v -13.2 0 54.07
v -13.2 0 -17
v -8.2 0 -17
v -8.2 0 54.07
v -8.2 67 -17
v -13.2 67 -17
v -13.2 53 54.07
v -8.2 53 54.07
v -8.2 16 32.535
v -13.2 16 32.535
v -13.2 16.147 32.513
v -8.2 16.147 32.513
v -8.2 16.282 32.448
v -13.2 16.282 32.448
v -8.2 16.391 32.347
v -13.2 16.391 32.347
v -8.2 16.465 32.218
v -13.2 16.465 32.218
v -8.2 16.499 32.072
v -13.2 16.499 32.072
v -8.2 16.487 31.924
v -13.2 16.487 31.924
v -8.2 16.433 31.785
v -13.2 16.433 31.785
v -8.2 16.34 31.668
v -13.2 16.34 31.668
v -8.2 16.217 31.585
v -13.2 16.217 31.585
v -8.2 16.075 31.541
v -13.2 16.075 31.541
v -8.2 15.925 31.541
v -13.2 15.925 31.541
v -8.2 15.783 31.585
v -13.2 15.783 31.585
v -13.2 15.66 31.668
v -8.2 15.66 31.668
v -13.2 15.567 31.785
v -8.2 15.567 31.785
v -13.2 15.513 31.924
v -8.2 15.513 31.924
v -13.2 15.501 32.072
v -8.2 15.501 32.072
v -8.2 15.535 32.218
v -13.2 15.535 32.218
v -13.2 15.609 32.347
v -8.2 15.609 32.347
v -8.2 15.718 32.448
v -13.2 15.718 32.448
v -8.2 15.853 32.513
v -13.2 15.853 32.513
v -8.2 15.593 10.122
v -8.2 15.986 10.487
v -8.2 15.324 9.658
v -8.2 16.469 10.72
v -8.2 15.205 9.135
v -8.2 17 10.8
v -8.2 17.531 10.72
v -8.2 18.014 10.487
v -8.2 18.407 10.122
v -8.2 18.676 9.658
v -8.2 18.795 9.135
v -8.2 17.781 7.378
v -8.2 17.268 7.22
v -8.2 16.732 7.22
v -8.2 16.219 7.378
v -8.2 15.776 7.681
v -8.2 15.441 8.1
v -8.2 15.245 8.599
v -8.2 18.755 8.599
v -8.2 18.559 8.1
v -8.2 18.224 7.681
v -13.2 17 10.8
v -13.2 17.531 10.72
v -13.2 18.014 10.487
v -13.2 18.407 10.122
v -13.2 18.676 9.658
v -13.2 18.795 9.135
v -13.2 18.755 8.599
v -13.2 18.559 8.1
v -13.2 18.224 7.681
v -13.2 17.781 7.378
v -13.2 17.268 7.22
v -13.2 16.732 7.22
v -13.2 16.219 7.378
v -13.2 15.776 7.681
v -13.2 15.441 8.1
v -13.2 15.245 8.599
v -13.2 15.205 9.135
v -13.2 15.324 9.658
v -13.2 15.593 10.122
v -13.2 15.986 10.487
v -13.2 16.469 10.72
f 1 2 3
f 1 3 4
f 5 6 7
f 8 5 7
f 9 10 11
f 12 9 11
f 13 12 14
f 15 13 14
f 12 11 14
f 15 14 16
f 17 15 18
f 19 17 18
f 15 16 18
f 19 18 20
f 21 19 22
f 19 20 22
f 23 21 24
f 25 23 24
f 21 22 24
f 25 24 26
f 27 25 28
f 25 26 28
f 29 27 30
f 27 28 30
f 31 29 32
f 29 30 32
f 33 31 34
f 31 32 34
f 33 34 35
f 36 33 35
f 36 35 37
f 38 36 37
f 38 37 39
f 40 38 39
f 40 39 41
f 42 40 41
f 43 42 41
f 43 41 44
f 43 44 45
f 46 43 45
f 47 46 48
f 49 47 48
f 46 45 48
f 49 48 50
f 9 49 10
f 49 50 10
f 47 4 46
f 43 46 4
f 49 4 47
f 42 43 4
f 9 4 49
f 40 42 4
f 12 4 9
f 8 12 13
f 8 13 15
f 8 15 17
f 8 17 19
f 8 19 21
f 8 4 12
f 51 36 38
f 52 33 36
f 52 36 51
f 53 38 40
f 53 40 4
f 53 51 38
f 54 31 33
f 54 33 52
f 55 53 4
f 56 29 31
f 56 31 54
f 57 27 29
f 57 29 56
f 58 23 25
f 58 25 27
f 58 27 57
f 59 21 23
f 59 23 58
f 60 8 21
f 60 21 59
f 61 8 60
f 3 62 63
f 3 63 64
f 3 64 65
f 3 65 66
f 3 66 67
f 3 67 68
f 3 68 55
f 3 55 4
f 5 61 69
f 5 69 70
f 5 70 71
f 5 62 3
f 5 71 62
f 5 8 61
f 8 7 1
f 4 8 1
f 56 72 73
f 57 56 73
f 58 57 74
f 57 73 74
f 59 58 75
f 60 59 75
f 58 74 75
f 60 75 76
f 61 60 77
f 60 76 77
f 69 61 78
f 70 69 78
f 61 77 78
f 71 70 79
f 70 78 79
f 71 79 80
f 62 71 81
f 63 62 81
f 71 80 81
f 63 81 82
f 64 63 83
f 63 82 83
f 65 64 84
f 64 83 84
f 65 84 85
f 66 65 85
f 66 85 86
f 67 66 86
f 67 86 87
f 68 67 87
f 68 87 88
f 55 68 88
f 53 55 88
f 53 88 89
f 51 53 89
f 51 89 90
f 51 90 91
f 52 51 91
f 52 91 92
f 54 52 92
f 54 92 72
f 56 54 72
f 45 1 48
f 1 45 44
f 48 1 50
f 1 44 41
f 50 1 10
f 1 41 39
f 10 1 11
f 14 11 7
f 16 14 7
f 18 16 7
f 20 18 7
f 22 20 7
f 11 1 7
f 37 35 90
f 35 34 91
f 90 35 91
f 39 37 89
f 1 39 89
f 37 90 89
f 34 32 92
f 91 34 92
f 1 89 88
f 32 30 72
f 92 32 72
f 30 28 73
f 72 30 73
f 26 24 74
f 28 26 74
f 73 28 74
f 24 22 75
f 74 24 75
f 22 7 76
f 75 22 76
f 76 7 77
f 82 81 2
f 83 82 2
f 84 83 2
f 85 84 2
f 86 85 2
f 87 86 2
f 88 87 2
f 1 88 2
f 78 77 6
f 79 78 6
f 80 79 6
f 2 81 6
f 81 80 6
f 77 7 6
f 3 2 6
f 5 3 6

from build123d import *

# Parameters (mm, degrees)
SKETCH1_W                = 50
SKETCH1_H                = 9.1
BOSS_EXTRUDE1_DEPTH      = 2
SKETCH2_W                = 25
SKETCH2_H                = 6.6
CUT_EXTRUDE1_DEPTH       = 2
SKETCH3_R                = 1.8
CUT_EXTRUDE2_DEPTH       = 2
SKETCH4_W                = 66.4
SKETCH4_H                = 130
BOSS_EXTRUDE2_DEPTH      = 2
SKETCH5_W                = 66.4
SKETCH5_H                = 2
BOSS_EXTRUDE3_DEPTH      = 2.5
SKETCH6_W                = 8.6
SKETCH6_H                = 62.5
BOSS_EXTRUDE4_DEPTH      = 2
SKETCH7_R                = 1.8
SKETCH7_W                = 3
SKETCH7_H                = 5
CUT_EXTRUDE3_DEPTH       = 2
SKETCH8_W                = 25
SKETCH8_H                = 45
CUT_EXTRUDE4_DEPTH       = 20
SKETCH9_W                = 25
SKETCH9_H                = 10
BOSS_EXTRUDE5_DEPTH      = 2
SKETCH10_W               = 34.7
SKETCH10_H               = 27.07
BOSS_EXTRUDE6_DEPTH      = 2
SKETCH11_R               = 1.8
CUT_EXTRUDE5_DEPTH       = 2
SKETCH12_R               = 1.8
CUT_EXTRUDE6_DEPTH       = 2
SKETCH13_W               = 2
SKETCH13_H               = 2
BOSS_EXTRUDE7_DEPTH      = 44
SKETCH14_W               = 2
SKETCH14_H               = 2
BOSS_EXTRUDE8_DEPTH      = 46
SKETCH16_W               = 42
SKETCH16_H               = 43
BOSS_EXTRUDE10_DEPTH     = 2
SKETCH18_R               = 1.8
CUT_EXTRUDE7_DEPTH       = 2
BOSS_EXTRUDE12_DEPTH     = 2
SKETCH21_W               = 2
SKETCH21_H               = 2
BOSS_EXTRUDE13_DEPTH     = 10
SKETCH25_W               = 3
SKETCH25_H               = 5
CUT_EXTRUDE8_DEPTH       = 10
SKETCH26_W               = 6.2
SKETCH26_H               = 13
SKETCH26_W_2             = 21
SKETCH26_H_2             = 6.6
BOSS_EXTRUDE14_DEPTH     = 2
SKETCH27_W               = 2
SKETCH27_H               = 27
SKETCH27_H_2             = 24.93
BOSS_EXTRUDE15_DEPTH     = 2
SKETCH29_W               = 10
SKETCH29_H               = 10
BOSS_EXTRUDE19_DEPTH     = 2
SKETCH41_R               = 1.8
CUT_EXTRUDE15_DEPTH      = 2
BOSS_EXTRUDE26_DEPTH     = 2
SKETCH43_W               = 70.4
SKETCH43_H               = 2
BOSS_EXTRUDE27_DEPTH     = 11
SKETCH44_W               = 10
SKETCH44_H               = 5
BOSS_EXTRUDE28_DEPTH     = 2
SKETCH45_R               = 1.8
BOSS_EXTRUDE29_DEPTH     = 2
SKETCH46_R               = 1.8
CUT_EXTRUDE16_DEPTH      = 2
SKETCH47_W               = 10
SKETCH47_H               = 1
BOSS_EXTRUDE30_DEPTH     = 2
SKETCH48_W               = 32.7
SKETCH48_H               = 31.07
SKETCH48_W_2             = 101.75
SKETCH48_H_2             = 120.487369876
CUT_EXTRUDE17_DEPTH      = 20
SKETCH50_W               = 66.4
SKETCH50_H               = 81.07
CUT_EXTRUDE19_DEPTH      = 20
SKETCH51_W               = 70.4
SKETCH51_H               = 85.07
SKETCH51_W_2             = 66.4
SKETCH51_H_2             = 81.07
BOSS_EXTRUDE31_DEPTH     = 20
SKETCH52_W               = 10
SKETCH52_H               = 1
BOSS_EXTRUDE32_DEPTH     = 2
SKETCH53_W               = 10
SKETCH53_H               = 4
CUT_EXTRUDE20_DEPTH      = 2
BOSS_EXTRUDE33_START     = 1
SKETCH54_W               = 10
SKETCH54_H               = 12
SKETCH54_R               = 1.8
BOSS_EXTRUDE33_DEPTH     = 1
CUT_EXTRUDE23_DEPTH      = 96
CUT_EXTRUDE23_DEPTH_BACK = 16
SKETCH59_R               = 1.8
SKETCH62_W               = 66.985033768
SKETCH62_H               = 11.249394984
BOSS_EXTRUDE38_DEPTH     = 1
SKETCH65_R               = 1.8
CUT_EXTRUDE27_DEPTH      = 3
SKETCH66_R               = 1
CUT_EXTRUDE28_DEPTH      = 87
BOSS_EXTRUDE41_DEPTH     = 2
BOSS_EXTRUDE42_DEPTH     = 2
BOSS_EXTRUDE43_DEPTH     = 2
SKETCH68_W               = 6.791832398
SKETCH68_H               = 8.144168394
SKETCH68_W_2             = 5.485710784
SKETCH68_W_3             = 7.764004839
SKETCH68_H_2             = 11.628907231
BOSS_EXTRUDE44_DEPTH     = 2
BOSS_EXTRUDE45_DEPTH     = 2
SKETCH70_R               = 1.8
CUT_EXTRUDE29_DEPTH      = 83
CUT_EXTRUDE30_DEPTH      = 75
CUT_EXTRUDE30_DEPTH_BACK = 16
SKETCH71_W               = 5.876146553
SKETCH71_H               = 39.481516924
SKETCH72_W               = 79.610987064
SKETCH72_H               = 92.479142301
CUT_EXTRUDE31_DEPTH      = 40
CUT_EXTRUDE32_DEPTH      = 43
CUT_EXTRUDE32_DEPTH_BACK = 22
SKETCH73_W               = 7.125351406
SKETCH73_H               = 50.874914307
SKETCH74_W               = 52.254946006
SKETCH74_H               = 40.33481622
CUT_EXTRUDE33_DEPTH      = 68
BOSS_EXTRUDE46_START     = 3
SKETCH75_W               = 81.07
SKETCH75_H               = 22
SKETCH75_R               = 1.8
SKETCH75_R_2             = 1
BOSS_EXTRUDE46_DEPTH     = 3
SKETCH76_R               = 1.8
SKETCH76_R_2             = 1
SKETCH76_R_3             = 0.5
BOSS_EXTRUDE47_DEPTH     = 5
SKETCH77_W               = 5
SKETCH77_H               = 22
CUT_EXTRUDE34_DEPTH      = 5
SKETCH78_W               = 5
SKETCH78_H               = 22
CUT_EXTRUDE35_DEPTH      = 5
BOSS_EXTRUDE49_DEPTH     = 5


with BuildPart() as part:
    # Sketch1 → Boss-Extrude1 (new body)
    with BuildSketch(Plane(origin=(0, 0, 0), x_dir=(1, 0, 0), z_dir=(0, 1, 0))):
        with Locations((25, 4.55)):
            Rectangle(SKETCH1_W, SKETCH1_H)
    extrude(amount=BOSS_EXTRUDE1_DEPTH)

    # Sketch2 → Cut-Extrude1 (cut)
    with BuildSketch(Plane(origin=(0, 2, 0), x_dir=(1, 0, 0), z_dir=(0, 1, 0))):
        with Locations((25, 5.8)):
            Rectangle(SKETCH2_W, SKETCH2_H)
    extrude(amount=-CUT_EXTRUDE1_DEPTH, mode=Mode.SUBTRACT)

    # Sketch3 → Cut-Extrude2 (cut)
    with BuildSketch(Plane(origin=(0, 2, 0), x_dir=(1, 0, 0), z_dir=(0, 1, 0))):
        with Locations(Location((6.25, 5.8, 0), (0, 0, 270))):
            Circle(SKETCH3_R)
        with Locations(Location((43.75, 5.8, 0), (0, 0, 270))):
            Circle(SKETCH3_R)
    extrude(amount=-CUT_EXTRUDE2_DEPTH, mode=Mode.SUBTRACT)

    # Sketch4 → Boss-Extrude2 (add)
    with BuildSketch(Plane(origin=(0, 2, 0), x_dir=(1, 0, 0), z_dir=(0, 1, 0))):
        with Locations((25, -65)):
            Rectangle(SKETCH4_W, SKETCH4_H)
    extrude(amount=-BOSS_EXTRUDE2_DEPTH)

    # Sketch5 → Boss-Extrude3 (add)
    with BuildSketch(Plane.XY.offset(130)):
        with Locations((25, 1)):
            Rectangle(SKETCH5_W, SKETCH5_H)
    extrude(amount=BOSS_EXTRUDE3_DEPTH)

    # Sketch6 → Boss-Extrude4 (add)
    with BuildSketch(Plane(origin=(0, 2, 0), x_dir=(1, 0, 0), z_dir=(0, 1, 0))):
        with Locations((-12.5, -101.25)):
            Rectangle(SKETCH6_W, SKETCH6_H)
        with Locations((62.5, -101.25)):
            Rectangle(SKETCH6_W, SKETCH6_H)
    extrude(amount=-BOSS_EXTRUDE4_DEPTH)

    # Sketch7 → Cut-Extrude3 (cut)
    with BuildSketch(Plane(origin=(0, 2, 0), x_dir=(1, 0, 0), z_dir=(0, 1, 0))):
        with Locations(Location((-13.5, -77, 0), (0, 0, 270))):
            Circle(SKETCH7_R)
        with Locations(Location((-13.5, -101.25, 0), (0, 0, 270))):
            Circle(SKETCH7_R)
        with Locations(Location((-13.5, -125.5, 0), (0, 0, 270))):
            Circle(SKETCH7_R)
        with Locations(Location((63.5, -77, 0), (0, 0, 270))):
            Circle(SKETCH7_R)
        with Locations(Location((63.5, -101.25, 0), (0, 0, 270))):
            Circle(SKETCH7_R)
        with Locations(Location((63.5, -125.5, 0), (0, 0, 270))):
            Circle(SKETCH7_R)
        with Locations((-13.5, -117.5)):
            Rectangle(SKETCH7_W, SKETCH7_H)
        with Locations((63.5, -117.5)):
            Rectangle(SKETCH7_W, SKETCH7_H)
    extrude(amount=-CUT_EXTRUDE3_DEPTH, mode=Mode.SUBTRACT)

    # Sketch8 → Cut-Extrude4 (cut)
    with BuildSketch(Plane(origin=(0, 2, 0), x_dir=(1, 0, 0), z_dir=(0, 1, 0))):
        with Locations((25, -22.5)):
            Rectangle(SKETCH8_W, SKETCH8_H)
    extrude(amount=-CUT_EXTRUDE4_DEPTH, mode=Mode.SUBTRACT)

    # Sketch9 → Boss-Extrude5 (add)
    with BuildSketch(Plane(origin=(0, 2, 0), x_dir=(1, 0, 0), z_dir=(0, 1, 0))):
        with Locations((25, -5)):
            Rectangle(SKETCH9_W, SKETCH9_H)
    extrude(amount=-BOSS_EXTRUDE5_DEPTH)

    # Sketch10 → Boss-Extrude6 (add)
    with BuildSketch(Plane(origin=(0, 2, 0), x_dir=(1, 0, 0), z_dir=(0, 1, 0))):
        with Locations((-25.55, -29.535)):
            Rectangle(SKETCH10_W, SKETCH10_H)
        with Locations((75.55, -29.535)):
            Rectangle(SKETCH10_W, SKETCH10_H)
    extrude(amount=-BOSS_EXTRUDE6_DEPTH)

    # Sketch11 → Cut-Extrude5 (cut)
    with BuildSketch(Plane(origin=(0, 2, 0), x_dir=(1, 0, 0), z_dir=(0, 1, 0))):
        with Locations(Location((-36.9, -19.25, 0), (0, 0, 270))):
            Circle(SKETCH11_R)
        with Locations(Location((-36.9, -39.82, 0), (0, 0, 270))):
            Circle(SKETCH11_R)
        with Locations(Location((-22.6, -19.25, 0), (0, 0, 270))):
            Circle(SKETCH11_R)
        with Locations(Location((-22.6, -39.82, 0), (0, 0, 270))):
            Circle(SKETCH11_R)
    extrude(amount=-CUT_EXTRUDE5_DEPTH, mode=Mode.SUBTRACT)

    # Sketch12 → Cut-Extrude6 (cut)
    with BuildSketch(Plane(origin=(0, 2, 0), x_dir=(1, 0, 0), z_dir=(0, 1, 0))):
        with Locations(Location((72.6, -19.25, 0), (0, 0, 270))):
            Circle(SKETCH12_R)
        with Locations(Location((86.9, -19.25, 0), (0, 0, 270))):
            Circle(SKETCH12_R)
        with Locations(Location((72.6, -39.82, 0), (0, 0, 270))):
            Circle(SKETCH12_R)
        with Locations(Location((86.9, -39.82, 0), (0, 0, 270))):
            Circle(SKETCH12_R)
    extrude(amount=-CUT_EXTRUDE6_DEPTH, mode=Mode.SUBTRACT)

    # Sketch13 → Boss-Extrude7 (add)
    with BuildSketch(Plane.ZY.offset(42.9)):
        with Locations((15, 1)):
            Rectangle(SKETCH13_W, SKETCH13_H)
        with Locations((44.07, 1)):
            Rectangle(SKETCH13_W, SKETCH13_H)
    extrude(amount=-BOSS_EXTRUDE7_DEPTH)

    # Sketch14 → Boss-Extrude8 (add)
    with BuildSketch(Plane(origin=(92.9, 0, 0), x_dir=(0, 0, -1), z_dir=(1, 0, 0))):
        with Locations((-15, 1)):
            Rectangle(SKETCH14_W, SKETCH14_H)
        with Locations((-44.07, 1)):
            Rectangle(SKETCH14_W, SKETCH14_H)
    extrude(amount=-BOSS_EXTRUDE8_DEPTH)

    # Sketch16 → Boss-Extrude10 (add)
    with BuildSketch(Plane(origin=(0, 2, 0), x_dir=(1, 0, 0), z_dir=(0, 1, 0))):
        with Locations((25, -154)):
            Rectangle(SKETCH16_W, SKETCH16_H)
    extrude(amount=-BOSS_EXTRUDE10_DEPTH)

    # Sketch18 → Cut-Extrude7 (cut)
    with BuildSketch(Plane(origin=(0, 2, 0), x_dir=(1, 0, 0), z_dir=(0, 1, 0))):
        with Locations(Location((8.74, -171.03, 0), (0, 0, 270))):
            Circle(SKETCH18_R)
        with Locations(Location((41.26, -171.03, 0), (0, 0, 270))):
            Circle(SKETCH18_R)
        with Locations(Location((8.74, -138.5, 0), (0, 0, 270))):
            Circle(SKETCH18_R)
        with Locations(Location((41.26, -138.5, 0), (0, 0, 270))):
            Circle(SKETCH18_R)
    extrude(amount=-CUT_EXTRUDE7_DEPTH, mode=Mode.SUBTRACT)

    # Sketch20 → Boss-Extrude12 (add)
    with BuildSketch(Plane(origin=(0, 2, 0), x_dir=(1, 0, 0), z_dir=(0, 1, 0))):
        with BuildLine():
            Line((-2, -132.5), (4, -132.5))
            Line((4, -132.5), (4, -138.5))
            ThreePointArc((4, -138.5), (2.242640687, -134.257359313), (-2, -132.5))
        make_face()
        with BuildLine():
            ThreePointArc((52, -132.5), (47.757359313, -134.257359313), (46, -138.5))
            Line((46, -138.5), (46, -132.5))
            Line((46, -132.5), (52, -132.5))
        make_face()
    extrude(amount=-BOSS_EXTRUDE12_DEPTH)

    # Sketch21 → Boss-Extrude13 (add)
    with BuildSketch(Plane(origin=(0, 0, -9.1), x_dir=(-1, 0, 0), z_dir=(0, 0, -1))):
        with Locations((-51, 1)):
            Rectangle(SKETCH21_W, SKETCH21_H)
        with Locations((-36.5, 1)):
            Rectangle(SKETCH21_W, SKETCH21_H)
        with Locations((-13.5, 1)):
            Rectangle(SKETCH21_W, SKETCH21_H)
        with Locations((1, 1)):
            Rectangle(SKETCH21_W, SKETCH21_H)
    extrude(amount=-BOSS_EXTRUDE13_DEPTH)

    # Sketch25 → Cut-Extrude8 (cut)
    with BuildSketch(Plane(origin=(0, 2, 0), x_dir=(1, 0, 0), z_dir=(0, 1, 0))):
        with Locations((-11.7, -22.5)):
            Rectangle(SKETCH25_W, SKETCH25_H)
        with Locations((-11.7, -36.57)):
            Rectangle(SKETCH25_W, SKETCH25_H)
        with Locations((61.7, -22.5)):
            Rectangle(SKETCH25_W, SKETCH25_H)
        with Locations((61.7, -36.57)):
            Rectangle(SKETCH25_W, SKETCH25_H)
    extrude(amount=-CUT_EXTRUDE8_DEPTH, mode=Mode.SUBTRACT)

    # Sketch26 → Boss-Extrude14 (add)
    with BuildSketch(Plane(origin=(0, 2, 0), x_dir=(1, 0, 0), z_dir=(0, 1, 0))):
        with Locations((-5.1, 6.5)):
            Rectangle(SKETCH26_W, SKETCH26_H)
        Polygon((-2, 13), (-2, 9.1), (14.5, 9.1), (35.5, 9.1), (52, 9.1), (52, 13), align=None)
        with Locations((25, 5.8)):
            Rectangle(SKETCH26_W_2, SKETCH26_H_2)
        with Locations((55.1, 6.5)):
            Rectangle(SKETCH26_W, SKETCH26_H)
    extrude(amount=-BOSS_EXTRUDE14_DEPTH)

    # Sketch27 → Boss-Extrude15 (add)
    with BuildSketch(Plane(origin=(0, 2, 0), x_dir=(1, 0, 0), z_dir=(0, 1, 0))):
        with Locations((-9.2, -0.5)):
            Rectangle(SKETCH27_W, SKETCH27_H)
        with Locations((-9.2, -57.535)):
            Rectangle(SKETCH27_W, SKETCH27_H_2)
        with Locations((59.2, -0.5)):
            Rectangle(SKETCH27_W, SKETCH27_H)
        with Locations((59.2, -57.535)):
            Rectangle(SKETCH27_W, SKETCH27_H_2)
    extrude(amount=-BOSS_EXTRUDE15_DEPTH)

    # Sketch29 → Boss-Extrude19 (add)
    with BuildSketch(Plane(origin=(0, 2, 0), x_dir=(1, 0, 0), z_dir=(0, 1, 0))):
        with Locations((-15.2, -9)):
            Rectangle(SKETCH29_W, SKETCH29_H)
        with Locations((-15.2, -50.07)):
            Rectangle(SKETCH29_W, SKETCH29_H)
        with Locations((65.2, -9)):
            Rectangle(SKETCH29_W, SKETCH29_H)
        with Locations((65.2, -50.07)):
            Rectangle(SKETCH29_W, SKETCH29_H)
    extrude(amount=-BOSS_EXTRUDE19_DEPTH)

    # Sketch41 → Cut-Extrude15 (cut)
    with BuildSketch(Plane(origin=(0, 2, 0), x_dir=(1, 0, 0), z_dir=(0, 1, 0))):
        with Locations(Location((-15.2, -9, 0), (0, 0, 270))):
            Circle(SKETCH41_R)
        with Locations(Location((-15.2, -50.07, 0), (0, 0, 270))):
            Circle(SKETCH41_R)
        with Locations(Location((65.2, -9, 0), (0, 0, 270))):
            Circle(SKETCH41_R)
        with Locations(Location((65.2, -50.07, 0), (0, 0, 270))):
            Circle(SKETCH41_R)
    extrude(amount=-CUT_EXTRUDE15_DEPTH, mode=Mode.SUBTRACT)

    # Sketch42 → Boss-Extrude26 (add)
    with BuildSketch(Plane(origin=(0, 2, 0), x_dir=(1, 0, 0), z_dir=(0, 1, 0))):
        with BuildLine():
            Line((-16.8, -70), (-10.2, -70))
            Line((-10.2, -70), (-10.2, -63.4))
            ThreePointArc((-10.2, -63.4), (-12.133095244, -68.066904756), (-16.8, -70))
        make_face()
        with BuildLine():
            Line((60.2, -63.4), (60.2, -70))
            Line((60.2, -70), (66.8, -70))
            ThreePointArc((66.8, -70), (62.133095244, -68.066904756), (60.2, -63.4))
        make_face()
    extrude(amount=-BOSS_EXTRUDE26_DEPTH)

    # Sketch43 → Boss-Extrude27 (add)
    with BuildSketch(Plane(origin=(0, 0, -13), x_dir=(-1, 0, 0), z_dir=(0, 0, -1))):
        with Locations((-25, 1)):
            Rectangle(SKETCH43_W, SKETCH43_H)
    extrude(amount=BOSS_EXTRUDE27_DEPTH)

    # Sketch44 → Boss-Extrude28 (add)
    with BuildSketch(Plane(origin=(0, 2, 0), x_dir=(1, 0, 0), z_dir=(0, 1, 0))):
        with Locations((-15.2, -57.57)):
            Rectangle(SKETCH44_W, SKETCH44_H)
        with Locations((65.2, -57.57)):
            Rectangle(SKETCH44_W, SKETCH44_H)
    extrude(amount=-BOSS_EXTRUDE28_DEPTH)

    # Sketch45 → Boss-Extrude29 (add)
    with BuildSketch(Plane(origin=(0, 2, 0), x_dir=(1, 0, 0), z_dir=(0, 1, 0))):
        with Locations((-15.2, -50.07)):
            Circle(SKETCH45_R)
        with Locations((65.2, -50.07)):
            Circle(SKETCH45_R)
    extrude(amount=-BOSS_EXTRUDE29_DEPTH)

    # Sketch46 → Cut-Extrude16 (cut)
    with BuildSketch(Plane(origin=(0, 2, 0), x_dir=(1, 0, 0), z_dir=(0, 1, 0))):
        with Locations(Location((-15.2, -55.07, 0), (0, 0, 270))):
            Circle(SKETCH46_R)
        with Locations(Location((65.2, -55.07, 0), (0, 0, 270))):
            Circle(SKETCH46_R)
    extrude(amount=-CUT_EXTRUDE16_DEPTH, mode=Mode.SUBTRACT)

    # Sketch47 → Boss-Extrude30 (add)
    with BuildSketch(Plane(origin=(0, 2, 0), x_dir=(1, 0, 0), z_dir=(0, 1, 0))):
        with Locations((-15.2, -3.5)):
            Rectangle(SKETCH47_W, SKETCH47_H)
        with Locations((-15.2, -60.57)):
            Rectangle(SKETCH47_W, SKETCH47_H)
        with Locations((65.2, -3.5)):
            Rectangle(SKETCH47_W, SKETCH47_H)
        with Locations((65.2, -60.57)):
            Rectangle(SKETCH47_W, SKETCH47_H)
    extrude(amount=-BOSS_EXTRUDE30_DEPTH)

    # Sketch48 → Cut-Extrude17 (cut)
    with BuildSketch(Plane(origin=(0, 2, 0), x_dir=(1, 0, 0), z_dir=(0, 1, 0))):
        with Locations((-26.55, -29.535)):
            Rectangle(SKETCH48_W, SKETCH48_H)
        with Locations((76.55, -29.535)):
            Rectangle(SKETCH48_W, SKETCH48_H)
        with Locations((30.675, -121.313684938)):
            Rectangle(SKETCH48_W_2, SKETCH48_H_2)
    extrude(amount=-CUT_EXTRUDE17_DEPTH, mode=Mode.SUBTRACT)

    # Sketch50 → Cut-Extrude19 (cut)
    with BuildSketch(Plane(origin=(0, 2, 0), x_dir=(1, 0, 0), z_dir=(0, 1, 0))):
        with Locations((25, -18.535)):
            Rectangle(SKETCH50_W, SKETCH50_H)
    extrude(amount=-CUT_EXTRUDE19_DEPTH, mode=Mode.SUBTRACT)

    # Sketch51 → Boss-Extrude31 (add)
    with BuildSketch(Plane(origin=(0, 2, 0), x_dir=(1, 0, 0), z_dir=(0, 1, 0))):
        with Locations((25, -18.535)):
            Rectangle(SKETCH51_W, SKETCH51_H)
        with Locations((25, -18.535)):
            Rectangle(SKETCH51_W_2, SKETCH51_H_2, mode=Mode.SUBTRACT)
    extrude(amount=BOSS_EXTRUDE31_DEPTH)

    # Sketch52 → Boss-Extrude32 (add)
    with BuildSketch(Plane(origin=(0, 2, 0), x_dir=(1, 0, 0), z_dir=(0, 1, 0))):
        with Locations((-15.2, -14.5)):
            Rectangle(SKETCH52_W, SKETCH52_H)
        with Locations((65.2, -14.5)):
            Rectangle(SKETCH52_W, SKETCH52_H)
    extrude(amount=-BOSS_EXTRUDE32_DEPTH)

    # Sketch53 → Cut-Extrude20 (cut)
    with BuildSketch(Plane(origin=(0, 2, 0), x_dir=(1, 0, 0), z_dir=(0, 1, 0))):
        with Locations((-15.2, -47.07)):
            Rectangle(SKETCH53_W, SKETCH53_H)
        with Locations((65.2, -47.07)):
            Rectangle(SKETCH53_W, SKETCH53_H)
    extrude(amount=-CUT_EXTRUDE20_DEPTH, mode=Mode.SUBTRACT)

    # Sketch54 → Boss-Extrude33 (add)
    # profile 1 of 4: a face of its own
    with BuildSketch(Plane(origin=(0, 2, 0), x_dir=(1, 0, 0), z_dir=(0, 1, 0)).offset(BOSS_EXTRUDE33_START)):
        with Locations((-15.2, -9)):
            Rectangle(SKETCH54_W, SKETCH54_H)
        with Locations(Location((-15.2, -9, 0), (0, 0, 270))):
            Circle(SKETCH54_R, mode=Mode.SUBTRACT)
    # profile 2 of 4: a face of its own
    with BuildSketch(Plane(origin=(0, 2, 0), x_dir=(1, 0, 0), z_dir=(0, 1, 0)).offset(BOSS_EXTRUDE33_START)):
        with Locations((-15.2, -55.07)):
            Rectangle(SKETCH54_W, SKETCH54_H)
        with Locations(Location((-15.2, -55.07, 0), (0, 0, 270))):
            Circle(SKETCH54_R, mode=Mode.SUBTRACT)
    # profile 3 of 4: a face of its own
    with BuildSketch(Plane(origin=(0, 2, 0), x_dir=(1, 0, 0), z_dir=(0, 1, 0)).offset(BOSS_EXTRUDE33_START)):
        with Locations((65.2, -9)):
            Rectangle(SKETCH54_W, SKETCH54_H)
        with Locations(Location((65.2, -9, 0), (0, 0, 270))):
            Circle(SKETCH54_R, mode=Mode.SUBTRACT)
    # profile 4 of 4: a face of its own
    with BuildSketch(Plane(origin=(0, 2, 0), x_dir=(1, 0, 0), z_dir=(0, 1, 0)).offset(BOSS_EXTRUDE33_START)):
        with Locations((65.2, -55.07)):
            Rectangle(SKETCH54_W, SKETCH54_H)
        with Locations(Location((65.2, -55.07, 0), (0, 0, 270))):
            Circle(SKETCH54_R, mode=Mode.SUBTRACT)
    extrude(amount=-BOSS_EXTRUDE33_DEPTH)

    # Sketch59 → Cut-Extrude23 (cut, two sides: drawn at the far end of the back side and taken through both)
    with BuildSketch(Plane.XY.offset(-22).offset(-CUT_EXTRUDE23_DEPTH_BACK)):
        with Locations((-3.2, 11)):
            Circle(SKETCH59_R)
        with Locations((53.2, 11)):
            Circle(SKETCH59_R)
        with Locations((25, 11)):
            Circle(SKETCH59_R)
    extrude(amount=CUT_EXTRUDE23_DEPTH + CUT_EXTRUDE23_DEPTH_BACK, mode=Mode.SUBTRACT)

    # Sketch62 → Boss-Extrude38 (add)
    with BuildSketch(Plane.XY.offset(61.07)):
        with Locations((24.914777311, 10.744331932)):
            Rectangle(SKETCH62_W, SKETCH62_H)
    extrude(amount=-BOSS_EXTRUDE38_DEPTH)

    # Sketch65 → Cut-Extrude27 (cut)
    with BuildSketch(Plane(origin=(0, 0, 59.07), x_dir=(-1, 0, 0), z_dir=(0, 0, -1))):
        with Locations((-13.8, 11)):
            Circle(SKETCH65_R)
        with Locations((-36.2, 11)):
            Circle(SKETCH65_R)
    extrude(amount=-CUT_EXTRUDE27_DEPTH, mode=Mode.SUBTRACT)

    # Sketch66 → Cut-Extrude28 (cut)
    with BuildSketch(Plane.ZY.offset(10.2)):
        with Locations((32.035, 16)):
            Circle(SKETCH66_R)
    extrude(amount=-CUT_EXTRUDE28_DEPTH, mode=Mode.SUBTRACT)

    # Sketch55 → Boss-Extrude41 (add)
    with BuildSketch(Plane(origin=(0, 0, 3), x_dir=(-1, 0, 0), z_dir=(0, 0, -1))):
        Polygon((20.2, 3), (10.2, 22), (10.2, 3), align=None)
        Polygon((-70.2, 3), (-60.2, 3), (-60.2, 22), align=None)
    extrude(amount=-BOSS_EXTRUDE41_DEPTH)

    # Sketch56 → Boss-Extrude42 (add)
    with BuildSketch(Plane.XY.offset(15)):
        Polygon((-20.2, 3), (-10.2, 3), (-10.2, 22), align=None)
        Polygon((70.2, 3), (60.2, 3), (60.2, 22), align=None)
    extrude(amount=-BOSS_EXTRUDE42_DEPTH)

    # Sketch57 → Boss-Extrude43 (add)
    with BuildSketch(Plane(origin=(0, 0, 49.07), x_dir=(-1, 0, 0), z_dir=(0, 0, -1))):
        Polygon((20.2, 3), (10.2, 3), (10.2, 22), align=None)
        Polygon((-70.2, 3), (-60.2, 3), (-60.2, 22), align=None)
    extrude(amount=-BOSS_EXTRUDE43_DEPTH)

    # Sketch68 → Boss-Extrude44 (add)
    with BuildSketch(Plane(origin=(0, 0, 59.07), x_dir=(-1, 0, 0), z_dir=(0, 0, -1))):
        with Locations((2.499419559, 10.346452983)):
            Rectangle(SKETCH68_W, SKETCH68_H)
        with Locations((-24.624372648, 10.346452983)):
            Rectangle(SKETCH68_W_2, SKETCH68_H)
        with Locations((-52.231743322, 12.088822401)):
            Rectangle(SKETCH68_W_3, SKETCH68_H_2)
    extrude(amount=-BOSS_EXTRUDE44_DEPTH)

    # Sketch69 → Boss-Extrude45 (add)
    with BuildSketch(Plane.XY.offset(61.07)):
        Polygon((-20.2, 3), (-10.2, 3), (-10.2, 22), align=None)
        Polygon((60.2, 3), (70.2, 3), (60.2, 22), align=None)
    extrude(amount=-BOSS_EXTRUDE45_DEPTH)

    # Sketch70 → Cut-Extrude29 (cut)
    with BuildSketch(Plane.ZY.offset(10.2)):
        with Locations((9, 17)):
            Circle(SKETCH70_R)
        with Locations((55.07, 17)):
            Circle(SKETCH70_R)
    extrude(amount=-CUT_EXTRUDE29_DEPTH, mode=Mode.SUBTRACT)

    # Sketch71 → Cut-Extrude30 (cut, two sides: drawn at the far end of the back side and taken through both)
    with BuildSketch(Plane(origin=(-8.2, 0, 0), x_dir=(0, 0, -1), z_dir=(1, 0, 0)).offset(-CUT_EXTRUDE30_DEPTH_BACK)):
        with Locations((24.938073276, 2.259241538)):
            Rectangle(SKETCH71_W, SKETCH71_H)
    extrude(amount=CUT_EXTRUDE30_DEPTH + CUT_EXTRUDE30_DEPTH_BACK, mode=Mode.SUBTRACT)

    # Sketch72 → Cut-Extrude31 (cut)
    with BuildSketch(Plane(origin=(0, 22, 0), x_dir=(1, 0, 0), z_dir=(0, 1, 0))):
        with Locations((38.564043948, -20.250754032)):
            Rectangle(SKETCH72_W, SKETCH72_H)
    extrude(amount=-CUT_EXTRUDE31_DEPTH, mode=Mode.SUBTRACT)

    # Sketch73 → Cut-Extrude32 (cut, two sides: drawn at the far end of the back side and taken through both)
    with BuildSketch(Plane(origin=(-8.2, 0, 0), x_dir=(0, 0, -1), z_dir=(1, 0, 0)).offset(-CUT_EXTRUDE32_DEPTH_BACK)):
        with Locations((-62.632675703, -3.437457154)):
            Rectangle(SKETCH73_W, SKETCH73_H)
    extrude(amount=CUT_EXTRUDE32_DEPTH + CUT_EXTRUDE32_DEPTH_BACK, mode=Mode.SUBTRACT)

    # Sketch74 → Cut-Extrude33 (cut)
    with BuildSketch(Plane(origin=(0, 0, 3), x_dir=(-1, 0, 0), z_dir=(0, 0, -1))):
        with Locations((36.327473003, 20.16740811)):
            Rectangle(SKETCH74_W, SKETCH74_H)
    extrude(amount=-CUT_EXTRUDE33_DEPTH, mode=Mode.SUBTRACT)

    # Sketch75 → Boss-Extrude46 (add)
    with BuildSketch(Plane.ZY.offset(10.2).offset(BOSS_EXTRUDE46_START)):
        with Locations((18.535, 11)):
            Rectangle(SKETCH75_W, SKETCH75_H)
        with Locations((9, 17)):
            Circle(SKETCH75_R, mode=Mode.SUBTRACT)
        with Locations((32.035, 16)):
            Circle(SKETCH75_R_2, mode=Mode.SUBTRACT)
        with Locations((55.07, 17)):
            Circle(SKETCH75_R, mode=Mode.SUBTRACT)
    extrude(amount=-BOSS_EXTRUDE46_DEPTH)

    # Sketch76 → Boss-Extrude47 (add)
    # profile 1 of 2: a face of its own
    with BuildSketch(Plane.ZY.offset(13.2)):
        with Locations((55.07, 17)):
            Circle(SKETCH76_R)
    # profile 2 of 2: a face of its own
    with BuildSketch(Plane.ZY.offset(13.2)):
        with Locations((32.035, 16)):
            Circle(SKETCH76_R_2)
        with Locations((32.035, 16)):
            Circle(SKETCH76_R_3, mode=Mode.SUBTRACT)
    extrude(amount=-BOSS_EXTRUDE47_DEPTH)

    # Sketch77 → Cut-Extrude34 (cut)
    with BuildSketch(Plane.XY.offset(59.07)):
        with Locations((-10.7, 11)):
            Rectangle(SKETCH77_W, SKETCH77_H)
    extrude(amount=-CUT_EXTRUDE34_DEPTH, mode=Mode.SUBTRACT)

    # Sketch78 → Cut-Extrude35 (cut)
    with BuildSketch(Plane(origin=(0, 0, -22), x_dir=(-1, 0, 0), z_dir=(0, 0, -1))):
        with Locations((10.7, 11)):
            Rectangle(SKETCH78_W, SKETCH78_H)
    extrude(amount=-CUT_EXTRUDE35_DEPTH, mode=Mode.SUBTRACT)

    # Sketch79 → Boss-Extrude49 (add)
    with BuildSketch(Plane.ZY.offset(13.2)):
        Polygon((-17, 22), (-17, 67), (54.07, 53), (54.07, 22), align=None)
    extrude(amount=-BOSS_EXTRUDE49_DEPTH)


solid = part.part
